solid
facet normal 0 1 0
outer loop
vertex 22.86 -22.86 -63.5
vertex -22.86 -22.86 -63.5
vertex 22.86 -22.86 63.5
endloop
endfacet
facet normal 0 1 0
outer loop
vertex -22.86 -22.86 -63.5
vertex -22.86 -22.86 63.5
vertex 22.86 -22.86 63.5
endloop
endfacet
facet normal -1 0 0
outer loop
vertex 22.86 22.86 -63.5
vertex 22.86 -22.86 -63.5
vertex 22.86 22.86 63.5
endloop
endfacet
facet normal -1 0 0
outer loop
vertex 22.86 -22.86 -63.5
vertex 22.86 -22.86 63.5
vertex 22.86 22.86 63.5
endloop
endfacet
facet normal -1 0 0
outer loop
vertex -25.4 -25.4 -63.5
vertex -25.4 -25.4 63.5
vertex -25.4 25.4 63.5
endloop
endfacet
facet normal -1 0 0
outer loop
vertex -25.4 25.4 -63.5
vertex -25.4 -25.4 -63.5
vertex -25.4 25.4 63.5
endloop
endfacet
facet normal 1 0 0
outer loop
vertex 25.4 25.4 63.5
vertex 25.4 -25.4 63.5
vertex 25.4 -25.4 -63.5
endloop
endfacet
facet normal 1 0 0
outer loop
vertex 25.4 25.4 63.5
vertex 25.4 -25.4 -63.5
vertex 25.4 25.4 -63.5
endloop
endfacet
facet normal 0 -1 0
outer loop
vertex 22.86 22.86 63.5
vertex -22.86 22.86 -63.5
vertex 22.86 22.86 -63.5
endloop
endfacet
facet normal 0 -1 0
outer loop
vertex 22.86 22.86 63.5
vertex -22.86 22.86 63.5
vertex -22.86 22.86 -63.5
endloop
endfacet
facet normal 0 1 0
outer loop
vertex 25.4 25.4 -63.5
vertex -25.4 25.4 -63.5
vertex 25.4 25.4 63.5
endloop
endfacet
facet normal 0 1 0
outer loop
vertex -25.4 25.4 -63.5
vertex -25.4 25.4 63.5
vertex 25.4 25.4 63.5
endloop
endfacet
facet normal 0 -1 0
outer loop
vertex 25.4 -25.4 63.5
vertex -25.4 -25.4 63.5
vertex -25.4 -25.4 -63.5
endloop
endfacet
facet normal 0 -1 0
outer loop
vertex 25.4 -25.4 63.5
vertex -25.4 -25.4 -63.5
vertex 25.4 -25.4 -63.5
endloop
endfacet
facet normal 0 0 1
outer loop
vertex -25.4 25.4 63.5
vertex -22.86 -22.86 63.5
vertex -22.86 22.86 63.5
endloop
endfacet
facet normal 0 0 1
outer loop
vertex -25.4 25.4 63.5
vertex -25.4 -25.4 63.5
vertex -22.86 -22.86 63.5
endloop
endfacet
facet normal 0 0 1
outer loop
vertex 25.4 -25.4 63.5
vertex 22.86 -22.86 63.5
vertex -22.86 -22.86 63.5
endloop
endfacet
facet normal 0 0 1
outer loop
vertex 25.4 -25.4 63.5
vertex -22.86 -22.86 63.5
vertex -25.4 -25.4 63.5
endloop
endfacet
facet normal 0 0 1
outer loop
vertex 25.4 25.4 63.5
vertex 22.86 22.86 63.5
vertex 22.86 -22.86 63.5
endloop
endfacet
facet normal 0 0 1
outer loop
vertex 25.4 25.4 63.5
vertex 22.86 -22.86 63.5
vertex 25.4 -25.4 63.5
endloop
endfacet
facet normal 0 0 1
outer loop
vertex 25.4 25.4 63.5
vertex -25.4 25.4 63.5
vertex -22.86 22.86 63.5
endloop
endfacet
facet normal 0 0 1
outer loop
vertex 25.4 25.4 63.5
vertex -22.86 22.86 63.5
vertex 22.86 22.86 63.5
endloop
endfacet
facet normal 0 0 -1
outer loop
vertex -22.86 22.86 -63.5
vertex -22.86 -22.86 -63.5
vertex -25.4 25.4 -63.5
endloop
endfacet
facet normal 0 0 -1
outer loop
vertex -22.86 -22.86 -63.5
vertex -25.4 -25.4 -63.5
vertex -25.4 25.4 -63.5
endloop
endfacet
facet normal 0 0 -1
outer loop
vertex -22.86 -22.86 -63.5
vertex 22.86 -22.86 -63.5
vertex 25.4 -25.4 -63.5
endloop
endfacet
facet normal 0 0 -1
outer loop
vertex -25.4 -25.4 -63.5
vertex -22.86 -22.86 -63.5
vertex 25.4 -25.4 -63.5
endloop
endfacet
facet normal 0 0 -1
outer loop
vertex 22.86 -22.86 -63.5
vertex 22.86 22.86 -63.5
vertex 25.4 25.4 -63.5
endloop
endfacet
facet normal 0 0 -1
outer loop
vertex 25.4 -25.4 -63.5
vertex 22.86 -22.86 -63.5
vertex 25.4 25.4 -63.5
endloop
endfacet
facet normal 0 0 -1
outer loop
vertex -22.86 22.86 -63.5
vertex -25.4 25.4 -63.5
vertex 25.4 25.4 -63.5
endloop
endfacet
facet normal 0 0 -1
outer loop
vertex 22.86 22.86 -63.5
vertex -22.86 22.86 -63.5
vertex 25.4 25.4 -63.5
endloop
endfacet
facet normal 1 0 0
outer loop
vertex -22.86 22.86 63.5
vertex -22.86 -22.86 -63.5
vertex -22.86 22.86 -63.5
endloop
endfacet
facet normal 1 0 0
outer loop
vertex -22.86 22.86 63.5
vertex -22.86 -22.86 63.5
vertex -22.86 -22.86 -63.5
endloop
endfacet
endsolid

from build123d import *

# Parameters (mm, degrees)
F0_W     = 50.8
F0_H     = 50.8
F1_DEPTH = 63.5
F2_T     = -2.54


with BuildPart() as f1:
    # F0 (on Top) → F1 (new body, symmetric)
    with BuildSketch(Plane.XY):
        Rectangle(F0_W, F0_H)
    extrude(amount=F1_DEPTH, both=True)

    # F2
    f2_openings = [f1.faces().sort_by_distance(p)[0] for p in [
        (0, 0, 63.5),
        (0, 0, -63.5),
    ]]
    offset(amount=F2_T, openings=f2_openings)


solid = f1.part
